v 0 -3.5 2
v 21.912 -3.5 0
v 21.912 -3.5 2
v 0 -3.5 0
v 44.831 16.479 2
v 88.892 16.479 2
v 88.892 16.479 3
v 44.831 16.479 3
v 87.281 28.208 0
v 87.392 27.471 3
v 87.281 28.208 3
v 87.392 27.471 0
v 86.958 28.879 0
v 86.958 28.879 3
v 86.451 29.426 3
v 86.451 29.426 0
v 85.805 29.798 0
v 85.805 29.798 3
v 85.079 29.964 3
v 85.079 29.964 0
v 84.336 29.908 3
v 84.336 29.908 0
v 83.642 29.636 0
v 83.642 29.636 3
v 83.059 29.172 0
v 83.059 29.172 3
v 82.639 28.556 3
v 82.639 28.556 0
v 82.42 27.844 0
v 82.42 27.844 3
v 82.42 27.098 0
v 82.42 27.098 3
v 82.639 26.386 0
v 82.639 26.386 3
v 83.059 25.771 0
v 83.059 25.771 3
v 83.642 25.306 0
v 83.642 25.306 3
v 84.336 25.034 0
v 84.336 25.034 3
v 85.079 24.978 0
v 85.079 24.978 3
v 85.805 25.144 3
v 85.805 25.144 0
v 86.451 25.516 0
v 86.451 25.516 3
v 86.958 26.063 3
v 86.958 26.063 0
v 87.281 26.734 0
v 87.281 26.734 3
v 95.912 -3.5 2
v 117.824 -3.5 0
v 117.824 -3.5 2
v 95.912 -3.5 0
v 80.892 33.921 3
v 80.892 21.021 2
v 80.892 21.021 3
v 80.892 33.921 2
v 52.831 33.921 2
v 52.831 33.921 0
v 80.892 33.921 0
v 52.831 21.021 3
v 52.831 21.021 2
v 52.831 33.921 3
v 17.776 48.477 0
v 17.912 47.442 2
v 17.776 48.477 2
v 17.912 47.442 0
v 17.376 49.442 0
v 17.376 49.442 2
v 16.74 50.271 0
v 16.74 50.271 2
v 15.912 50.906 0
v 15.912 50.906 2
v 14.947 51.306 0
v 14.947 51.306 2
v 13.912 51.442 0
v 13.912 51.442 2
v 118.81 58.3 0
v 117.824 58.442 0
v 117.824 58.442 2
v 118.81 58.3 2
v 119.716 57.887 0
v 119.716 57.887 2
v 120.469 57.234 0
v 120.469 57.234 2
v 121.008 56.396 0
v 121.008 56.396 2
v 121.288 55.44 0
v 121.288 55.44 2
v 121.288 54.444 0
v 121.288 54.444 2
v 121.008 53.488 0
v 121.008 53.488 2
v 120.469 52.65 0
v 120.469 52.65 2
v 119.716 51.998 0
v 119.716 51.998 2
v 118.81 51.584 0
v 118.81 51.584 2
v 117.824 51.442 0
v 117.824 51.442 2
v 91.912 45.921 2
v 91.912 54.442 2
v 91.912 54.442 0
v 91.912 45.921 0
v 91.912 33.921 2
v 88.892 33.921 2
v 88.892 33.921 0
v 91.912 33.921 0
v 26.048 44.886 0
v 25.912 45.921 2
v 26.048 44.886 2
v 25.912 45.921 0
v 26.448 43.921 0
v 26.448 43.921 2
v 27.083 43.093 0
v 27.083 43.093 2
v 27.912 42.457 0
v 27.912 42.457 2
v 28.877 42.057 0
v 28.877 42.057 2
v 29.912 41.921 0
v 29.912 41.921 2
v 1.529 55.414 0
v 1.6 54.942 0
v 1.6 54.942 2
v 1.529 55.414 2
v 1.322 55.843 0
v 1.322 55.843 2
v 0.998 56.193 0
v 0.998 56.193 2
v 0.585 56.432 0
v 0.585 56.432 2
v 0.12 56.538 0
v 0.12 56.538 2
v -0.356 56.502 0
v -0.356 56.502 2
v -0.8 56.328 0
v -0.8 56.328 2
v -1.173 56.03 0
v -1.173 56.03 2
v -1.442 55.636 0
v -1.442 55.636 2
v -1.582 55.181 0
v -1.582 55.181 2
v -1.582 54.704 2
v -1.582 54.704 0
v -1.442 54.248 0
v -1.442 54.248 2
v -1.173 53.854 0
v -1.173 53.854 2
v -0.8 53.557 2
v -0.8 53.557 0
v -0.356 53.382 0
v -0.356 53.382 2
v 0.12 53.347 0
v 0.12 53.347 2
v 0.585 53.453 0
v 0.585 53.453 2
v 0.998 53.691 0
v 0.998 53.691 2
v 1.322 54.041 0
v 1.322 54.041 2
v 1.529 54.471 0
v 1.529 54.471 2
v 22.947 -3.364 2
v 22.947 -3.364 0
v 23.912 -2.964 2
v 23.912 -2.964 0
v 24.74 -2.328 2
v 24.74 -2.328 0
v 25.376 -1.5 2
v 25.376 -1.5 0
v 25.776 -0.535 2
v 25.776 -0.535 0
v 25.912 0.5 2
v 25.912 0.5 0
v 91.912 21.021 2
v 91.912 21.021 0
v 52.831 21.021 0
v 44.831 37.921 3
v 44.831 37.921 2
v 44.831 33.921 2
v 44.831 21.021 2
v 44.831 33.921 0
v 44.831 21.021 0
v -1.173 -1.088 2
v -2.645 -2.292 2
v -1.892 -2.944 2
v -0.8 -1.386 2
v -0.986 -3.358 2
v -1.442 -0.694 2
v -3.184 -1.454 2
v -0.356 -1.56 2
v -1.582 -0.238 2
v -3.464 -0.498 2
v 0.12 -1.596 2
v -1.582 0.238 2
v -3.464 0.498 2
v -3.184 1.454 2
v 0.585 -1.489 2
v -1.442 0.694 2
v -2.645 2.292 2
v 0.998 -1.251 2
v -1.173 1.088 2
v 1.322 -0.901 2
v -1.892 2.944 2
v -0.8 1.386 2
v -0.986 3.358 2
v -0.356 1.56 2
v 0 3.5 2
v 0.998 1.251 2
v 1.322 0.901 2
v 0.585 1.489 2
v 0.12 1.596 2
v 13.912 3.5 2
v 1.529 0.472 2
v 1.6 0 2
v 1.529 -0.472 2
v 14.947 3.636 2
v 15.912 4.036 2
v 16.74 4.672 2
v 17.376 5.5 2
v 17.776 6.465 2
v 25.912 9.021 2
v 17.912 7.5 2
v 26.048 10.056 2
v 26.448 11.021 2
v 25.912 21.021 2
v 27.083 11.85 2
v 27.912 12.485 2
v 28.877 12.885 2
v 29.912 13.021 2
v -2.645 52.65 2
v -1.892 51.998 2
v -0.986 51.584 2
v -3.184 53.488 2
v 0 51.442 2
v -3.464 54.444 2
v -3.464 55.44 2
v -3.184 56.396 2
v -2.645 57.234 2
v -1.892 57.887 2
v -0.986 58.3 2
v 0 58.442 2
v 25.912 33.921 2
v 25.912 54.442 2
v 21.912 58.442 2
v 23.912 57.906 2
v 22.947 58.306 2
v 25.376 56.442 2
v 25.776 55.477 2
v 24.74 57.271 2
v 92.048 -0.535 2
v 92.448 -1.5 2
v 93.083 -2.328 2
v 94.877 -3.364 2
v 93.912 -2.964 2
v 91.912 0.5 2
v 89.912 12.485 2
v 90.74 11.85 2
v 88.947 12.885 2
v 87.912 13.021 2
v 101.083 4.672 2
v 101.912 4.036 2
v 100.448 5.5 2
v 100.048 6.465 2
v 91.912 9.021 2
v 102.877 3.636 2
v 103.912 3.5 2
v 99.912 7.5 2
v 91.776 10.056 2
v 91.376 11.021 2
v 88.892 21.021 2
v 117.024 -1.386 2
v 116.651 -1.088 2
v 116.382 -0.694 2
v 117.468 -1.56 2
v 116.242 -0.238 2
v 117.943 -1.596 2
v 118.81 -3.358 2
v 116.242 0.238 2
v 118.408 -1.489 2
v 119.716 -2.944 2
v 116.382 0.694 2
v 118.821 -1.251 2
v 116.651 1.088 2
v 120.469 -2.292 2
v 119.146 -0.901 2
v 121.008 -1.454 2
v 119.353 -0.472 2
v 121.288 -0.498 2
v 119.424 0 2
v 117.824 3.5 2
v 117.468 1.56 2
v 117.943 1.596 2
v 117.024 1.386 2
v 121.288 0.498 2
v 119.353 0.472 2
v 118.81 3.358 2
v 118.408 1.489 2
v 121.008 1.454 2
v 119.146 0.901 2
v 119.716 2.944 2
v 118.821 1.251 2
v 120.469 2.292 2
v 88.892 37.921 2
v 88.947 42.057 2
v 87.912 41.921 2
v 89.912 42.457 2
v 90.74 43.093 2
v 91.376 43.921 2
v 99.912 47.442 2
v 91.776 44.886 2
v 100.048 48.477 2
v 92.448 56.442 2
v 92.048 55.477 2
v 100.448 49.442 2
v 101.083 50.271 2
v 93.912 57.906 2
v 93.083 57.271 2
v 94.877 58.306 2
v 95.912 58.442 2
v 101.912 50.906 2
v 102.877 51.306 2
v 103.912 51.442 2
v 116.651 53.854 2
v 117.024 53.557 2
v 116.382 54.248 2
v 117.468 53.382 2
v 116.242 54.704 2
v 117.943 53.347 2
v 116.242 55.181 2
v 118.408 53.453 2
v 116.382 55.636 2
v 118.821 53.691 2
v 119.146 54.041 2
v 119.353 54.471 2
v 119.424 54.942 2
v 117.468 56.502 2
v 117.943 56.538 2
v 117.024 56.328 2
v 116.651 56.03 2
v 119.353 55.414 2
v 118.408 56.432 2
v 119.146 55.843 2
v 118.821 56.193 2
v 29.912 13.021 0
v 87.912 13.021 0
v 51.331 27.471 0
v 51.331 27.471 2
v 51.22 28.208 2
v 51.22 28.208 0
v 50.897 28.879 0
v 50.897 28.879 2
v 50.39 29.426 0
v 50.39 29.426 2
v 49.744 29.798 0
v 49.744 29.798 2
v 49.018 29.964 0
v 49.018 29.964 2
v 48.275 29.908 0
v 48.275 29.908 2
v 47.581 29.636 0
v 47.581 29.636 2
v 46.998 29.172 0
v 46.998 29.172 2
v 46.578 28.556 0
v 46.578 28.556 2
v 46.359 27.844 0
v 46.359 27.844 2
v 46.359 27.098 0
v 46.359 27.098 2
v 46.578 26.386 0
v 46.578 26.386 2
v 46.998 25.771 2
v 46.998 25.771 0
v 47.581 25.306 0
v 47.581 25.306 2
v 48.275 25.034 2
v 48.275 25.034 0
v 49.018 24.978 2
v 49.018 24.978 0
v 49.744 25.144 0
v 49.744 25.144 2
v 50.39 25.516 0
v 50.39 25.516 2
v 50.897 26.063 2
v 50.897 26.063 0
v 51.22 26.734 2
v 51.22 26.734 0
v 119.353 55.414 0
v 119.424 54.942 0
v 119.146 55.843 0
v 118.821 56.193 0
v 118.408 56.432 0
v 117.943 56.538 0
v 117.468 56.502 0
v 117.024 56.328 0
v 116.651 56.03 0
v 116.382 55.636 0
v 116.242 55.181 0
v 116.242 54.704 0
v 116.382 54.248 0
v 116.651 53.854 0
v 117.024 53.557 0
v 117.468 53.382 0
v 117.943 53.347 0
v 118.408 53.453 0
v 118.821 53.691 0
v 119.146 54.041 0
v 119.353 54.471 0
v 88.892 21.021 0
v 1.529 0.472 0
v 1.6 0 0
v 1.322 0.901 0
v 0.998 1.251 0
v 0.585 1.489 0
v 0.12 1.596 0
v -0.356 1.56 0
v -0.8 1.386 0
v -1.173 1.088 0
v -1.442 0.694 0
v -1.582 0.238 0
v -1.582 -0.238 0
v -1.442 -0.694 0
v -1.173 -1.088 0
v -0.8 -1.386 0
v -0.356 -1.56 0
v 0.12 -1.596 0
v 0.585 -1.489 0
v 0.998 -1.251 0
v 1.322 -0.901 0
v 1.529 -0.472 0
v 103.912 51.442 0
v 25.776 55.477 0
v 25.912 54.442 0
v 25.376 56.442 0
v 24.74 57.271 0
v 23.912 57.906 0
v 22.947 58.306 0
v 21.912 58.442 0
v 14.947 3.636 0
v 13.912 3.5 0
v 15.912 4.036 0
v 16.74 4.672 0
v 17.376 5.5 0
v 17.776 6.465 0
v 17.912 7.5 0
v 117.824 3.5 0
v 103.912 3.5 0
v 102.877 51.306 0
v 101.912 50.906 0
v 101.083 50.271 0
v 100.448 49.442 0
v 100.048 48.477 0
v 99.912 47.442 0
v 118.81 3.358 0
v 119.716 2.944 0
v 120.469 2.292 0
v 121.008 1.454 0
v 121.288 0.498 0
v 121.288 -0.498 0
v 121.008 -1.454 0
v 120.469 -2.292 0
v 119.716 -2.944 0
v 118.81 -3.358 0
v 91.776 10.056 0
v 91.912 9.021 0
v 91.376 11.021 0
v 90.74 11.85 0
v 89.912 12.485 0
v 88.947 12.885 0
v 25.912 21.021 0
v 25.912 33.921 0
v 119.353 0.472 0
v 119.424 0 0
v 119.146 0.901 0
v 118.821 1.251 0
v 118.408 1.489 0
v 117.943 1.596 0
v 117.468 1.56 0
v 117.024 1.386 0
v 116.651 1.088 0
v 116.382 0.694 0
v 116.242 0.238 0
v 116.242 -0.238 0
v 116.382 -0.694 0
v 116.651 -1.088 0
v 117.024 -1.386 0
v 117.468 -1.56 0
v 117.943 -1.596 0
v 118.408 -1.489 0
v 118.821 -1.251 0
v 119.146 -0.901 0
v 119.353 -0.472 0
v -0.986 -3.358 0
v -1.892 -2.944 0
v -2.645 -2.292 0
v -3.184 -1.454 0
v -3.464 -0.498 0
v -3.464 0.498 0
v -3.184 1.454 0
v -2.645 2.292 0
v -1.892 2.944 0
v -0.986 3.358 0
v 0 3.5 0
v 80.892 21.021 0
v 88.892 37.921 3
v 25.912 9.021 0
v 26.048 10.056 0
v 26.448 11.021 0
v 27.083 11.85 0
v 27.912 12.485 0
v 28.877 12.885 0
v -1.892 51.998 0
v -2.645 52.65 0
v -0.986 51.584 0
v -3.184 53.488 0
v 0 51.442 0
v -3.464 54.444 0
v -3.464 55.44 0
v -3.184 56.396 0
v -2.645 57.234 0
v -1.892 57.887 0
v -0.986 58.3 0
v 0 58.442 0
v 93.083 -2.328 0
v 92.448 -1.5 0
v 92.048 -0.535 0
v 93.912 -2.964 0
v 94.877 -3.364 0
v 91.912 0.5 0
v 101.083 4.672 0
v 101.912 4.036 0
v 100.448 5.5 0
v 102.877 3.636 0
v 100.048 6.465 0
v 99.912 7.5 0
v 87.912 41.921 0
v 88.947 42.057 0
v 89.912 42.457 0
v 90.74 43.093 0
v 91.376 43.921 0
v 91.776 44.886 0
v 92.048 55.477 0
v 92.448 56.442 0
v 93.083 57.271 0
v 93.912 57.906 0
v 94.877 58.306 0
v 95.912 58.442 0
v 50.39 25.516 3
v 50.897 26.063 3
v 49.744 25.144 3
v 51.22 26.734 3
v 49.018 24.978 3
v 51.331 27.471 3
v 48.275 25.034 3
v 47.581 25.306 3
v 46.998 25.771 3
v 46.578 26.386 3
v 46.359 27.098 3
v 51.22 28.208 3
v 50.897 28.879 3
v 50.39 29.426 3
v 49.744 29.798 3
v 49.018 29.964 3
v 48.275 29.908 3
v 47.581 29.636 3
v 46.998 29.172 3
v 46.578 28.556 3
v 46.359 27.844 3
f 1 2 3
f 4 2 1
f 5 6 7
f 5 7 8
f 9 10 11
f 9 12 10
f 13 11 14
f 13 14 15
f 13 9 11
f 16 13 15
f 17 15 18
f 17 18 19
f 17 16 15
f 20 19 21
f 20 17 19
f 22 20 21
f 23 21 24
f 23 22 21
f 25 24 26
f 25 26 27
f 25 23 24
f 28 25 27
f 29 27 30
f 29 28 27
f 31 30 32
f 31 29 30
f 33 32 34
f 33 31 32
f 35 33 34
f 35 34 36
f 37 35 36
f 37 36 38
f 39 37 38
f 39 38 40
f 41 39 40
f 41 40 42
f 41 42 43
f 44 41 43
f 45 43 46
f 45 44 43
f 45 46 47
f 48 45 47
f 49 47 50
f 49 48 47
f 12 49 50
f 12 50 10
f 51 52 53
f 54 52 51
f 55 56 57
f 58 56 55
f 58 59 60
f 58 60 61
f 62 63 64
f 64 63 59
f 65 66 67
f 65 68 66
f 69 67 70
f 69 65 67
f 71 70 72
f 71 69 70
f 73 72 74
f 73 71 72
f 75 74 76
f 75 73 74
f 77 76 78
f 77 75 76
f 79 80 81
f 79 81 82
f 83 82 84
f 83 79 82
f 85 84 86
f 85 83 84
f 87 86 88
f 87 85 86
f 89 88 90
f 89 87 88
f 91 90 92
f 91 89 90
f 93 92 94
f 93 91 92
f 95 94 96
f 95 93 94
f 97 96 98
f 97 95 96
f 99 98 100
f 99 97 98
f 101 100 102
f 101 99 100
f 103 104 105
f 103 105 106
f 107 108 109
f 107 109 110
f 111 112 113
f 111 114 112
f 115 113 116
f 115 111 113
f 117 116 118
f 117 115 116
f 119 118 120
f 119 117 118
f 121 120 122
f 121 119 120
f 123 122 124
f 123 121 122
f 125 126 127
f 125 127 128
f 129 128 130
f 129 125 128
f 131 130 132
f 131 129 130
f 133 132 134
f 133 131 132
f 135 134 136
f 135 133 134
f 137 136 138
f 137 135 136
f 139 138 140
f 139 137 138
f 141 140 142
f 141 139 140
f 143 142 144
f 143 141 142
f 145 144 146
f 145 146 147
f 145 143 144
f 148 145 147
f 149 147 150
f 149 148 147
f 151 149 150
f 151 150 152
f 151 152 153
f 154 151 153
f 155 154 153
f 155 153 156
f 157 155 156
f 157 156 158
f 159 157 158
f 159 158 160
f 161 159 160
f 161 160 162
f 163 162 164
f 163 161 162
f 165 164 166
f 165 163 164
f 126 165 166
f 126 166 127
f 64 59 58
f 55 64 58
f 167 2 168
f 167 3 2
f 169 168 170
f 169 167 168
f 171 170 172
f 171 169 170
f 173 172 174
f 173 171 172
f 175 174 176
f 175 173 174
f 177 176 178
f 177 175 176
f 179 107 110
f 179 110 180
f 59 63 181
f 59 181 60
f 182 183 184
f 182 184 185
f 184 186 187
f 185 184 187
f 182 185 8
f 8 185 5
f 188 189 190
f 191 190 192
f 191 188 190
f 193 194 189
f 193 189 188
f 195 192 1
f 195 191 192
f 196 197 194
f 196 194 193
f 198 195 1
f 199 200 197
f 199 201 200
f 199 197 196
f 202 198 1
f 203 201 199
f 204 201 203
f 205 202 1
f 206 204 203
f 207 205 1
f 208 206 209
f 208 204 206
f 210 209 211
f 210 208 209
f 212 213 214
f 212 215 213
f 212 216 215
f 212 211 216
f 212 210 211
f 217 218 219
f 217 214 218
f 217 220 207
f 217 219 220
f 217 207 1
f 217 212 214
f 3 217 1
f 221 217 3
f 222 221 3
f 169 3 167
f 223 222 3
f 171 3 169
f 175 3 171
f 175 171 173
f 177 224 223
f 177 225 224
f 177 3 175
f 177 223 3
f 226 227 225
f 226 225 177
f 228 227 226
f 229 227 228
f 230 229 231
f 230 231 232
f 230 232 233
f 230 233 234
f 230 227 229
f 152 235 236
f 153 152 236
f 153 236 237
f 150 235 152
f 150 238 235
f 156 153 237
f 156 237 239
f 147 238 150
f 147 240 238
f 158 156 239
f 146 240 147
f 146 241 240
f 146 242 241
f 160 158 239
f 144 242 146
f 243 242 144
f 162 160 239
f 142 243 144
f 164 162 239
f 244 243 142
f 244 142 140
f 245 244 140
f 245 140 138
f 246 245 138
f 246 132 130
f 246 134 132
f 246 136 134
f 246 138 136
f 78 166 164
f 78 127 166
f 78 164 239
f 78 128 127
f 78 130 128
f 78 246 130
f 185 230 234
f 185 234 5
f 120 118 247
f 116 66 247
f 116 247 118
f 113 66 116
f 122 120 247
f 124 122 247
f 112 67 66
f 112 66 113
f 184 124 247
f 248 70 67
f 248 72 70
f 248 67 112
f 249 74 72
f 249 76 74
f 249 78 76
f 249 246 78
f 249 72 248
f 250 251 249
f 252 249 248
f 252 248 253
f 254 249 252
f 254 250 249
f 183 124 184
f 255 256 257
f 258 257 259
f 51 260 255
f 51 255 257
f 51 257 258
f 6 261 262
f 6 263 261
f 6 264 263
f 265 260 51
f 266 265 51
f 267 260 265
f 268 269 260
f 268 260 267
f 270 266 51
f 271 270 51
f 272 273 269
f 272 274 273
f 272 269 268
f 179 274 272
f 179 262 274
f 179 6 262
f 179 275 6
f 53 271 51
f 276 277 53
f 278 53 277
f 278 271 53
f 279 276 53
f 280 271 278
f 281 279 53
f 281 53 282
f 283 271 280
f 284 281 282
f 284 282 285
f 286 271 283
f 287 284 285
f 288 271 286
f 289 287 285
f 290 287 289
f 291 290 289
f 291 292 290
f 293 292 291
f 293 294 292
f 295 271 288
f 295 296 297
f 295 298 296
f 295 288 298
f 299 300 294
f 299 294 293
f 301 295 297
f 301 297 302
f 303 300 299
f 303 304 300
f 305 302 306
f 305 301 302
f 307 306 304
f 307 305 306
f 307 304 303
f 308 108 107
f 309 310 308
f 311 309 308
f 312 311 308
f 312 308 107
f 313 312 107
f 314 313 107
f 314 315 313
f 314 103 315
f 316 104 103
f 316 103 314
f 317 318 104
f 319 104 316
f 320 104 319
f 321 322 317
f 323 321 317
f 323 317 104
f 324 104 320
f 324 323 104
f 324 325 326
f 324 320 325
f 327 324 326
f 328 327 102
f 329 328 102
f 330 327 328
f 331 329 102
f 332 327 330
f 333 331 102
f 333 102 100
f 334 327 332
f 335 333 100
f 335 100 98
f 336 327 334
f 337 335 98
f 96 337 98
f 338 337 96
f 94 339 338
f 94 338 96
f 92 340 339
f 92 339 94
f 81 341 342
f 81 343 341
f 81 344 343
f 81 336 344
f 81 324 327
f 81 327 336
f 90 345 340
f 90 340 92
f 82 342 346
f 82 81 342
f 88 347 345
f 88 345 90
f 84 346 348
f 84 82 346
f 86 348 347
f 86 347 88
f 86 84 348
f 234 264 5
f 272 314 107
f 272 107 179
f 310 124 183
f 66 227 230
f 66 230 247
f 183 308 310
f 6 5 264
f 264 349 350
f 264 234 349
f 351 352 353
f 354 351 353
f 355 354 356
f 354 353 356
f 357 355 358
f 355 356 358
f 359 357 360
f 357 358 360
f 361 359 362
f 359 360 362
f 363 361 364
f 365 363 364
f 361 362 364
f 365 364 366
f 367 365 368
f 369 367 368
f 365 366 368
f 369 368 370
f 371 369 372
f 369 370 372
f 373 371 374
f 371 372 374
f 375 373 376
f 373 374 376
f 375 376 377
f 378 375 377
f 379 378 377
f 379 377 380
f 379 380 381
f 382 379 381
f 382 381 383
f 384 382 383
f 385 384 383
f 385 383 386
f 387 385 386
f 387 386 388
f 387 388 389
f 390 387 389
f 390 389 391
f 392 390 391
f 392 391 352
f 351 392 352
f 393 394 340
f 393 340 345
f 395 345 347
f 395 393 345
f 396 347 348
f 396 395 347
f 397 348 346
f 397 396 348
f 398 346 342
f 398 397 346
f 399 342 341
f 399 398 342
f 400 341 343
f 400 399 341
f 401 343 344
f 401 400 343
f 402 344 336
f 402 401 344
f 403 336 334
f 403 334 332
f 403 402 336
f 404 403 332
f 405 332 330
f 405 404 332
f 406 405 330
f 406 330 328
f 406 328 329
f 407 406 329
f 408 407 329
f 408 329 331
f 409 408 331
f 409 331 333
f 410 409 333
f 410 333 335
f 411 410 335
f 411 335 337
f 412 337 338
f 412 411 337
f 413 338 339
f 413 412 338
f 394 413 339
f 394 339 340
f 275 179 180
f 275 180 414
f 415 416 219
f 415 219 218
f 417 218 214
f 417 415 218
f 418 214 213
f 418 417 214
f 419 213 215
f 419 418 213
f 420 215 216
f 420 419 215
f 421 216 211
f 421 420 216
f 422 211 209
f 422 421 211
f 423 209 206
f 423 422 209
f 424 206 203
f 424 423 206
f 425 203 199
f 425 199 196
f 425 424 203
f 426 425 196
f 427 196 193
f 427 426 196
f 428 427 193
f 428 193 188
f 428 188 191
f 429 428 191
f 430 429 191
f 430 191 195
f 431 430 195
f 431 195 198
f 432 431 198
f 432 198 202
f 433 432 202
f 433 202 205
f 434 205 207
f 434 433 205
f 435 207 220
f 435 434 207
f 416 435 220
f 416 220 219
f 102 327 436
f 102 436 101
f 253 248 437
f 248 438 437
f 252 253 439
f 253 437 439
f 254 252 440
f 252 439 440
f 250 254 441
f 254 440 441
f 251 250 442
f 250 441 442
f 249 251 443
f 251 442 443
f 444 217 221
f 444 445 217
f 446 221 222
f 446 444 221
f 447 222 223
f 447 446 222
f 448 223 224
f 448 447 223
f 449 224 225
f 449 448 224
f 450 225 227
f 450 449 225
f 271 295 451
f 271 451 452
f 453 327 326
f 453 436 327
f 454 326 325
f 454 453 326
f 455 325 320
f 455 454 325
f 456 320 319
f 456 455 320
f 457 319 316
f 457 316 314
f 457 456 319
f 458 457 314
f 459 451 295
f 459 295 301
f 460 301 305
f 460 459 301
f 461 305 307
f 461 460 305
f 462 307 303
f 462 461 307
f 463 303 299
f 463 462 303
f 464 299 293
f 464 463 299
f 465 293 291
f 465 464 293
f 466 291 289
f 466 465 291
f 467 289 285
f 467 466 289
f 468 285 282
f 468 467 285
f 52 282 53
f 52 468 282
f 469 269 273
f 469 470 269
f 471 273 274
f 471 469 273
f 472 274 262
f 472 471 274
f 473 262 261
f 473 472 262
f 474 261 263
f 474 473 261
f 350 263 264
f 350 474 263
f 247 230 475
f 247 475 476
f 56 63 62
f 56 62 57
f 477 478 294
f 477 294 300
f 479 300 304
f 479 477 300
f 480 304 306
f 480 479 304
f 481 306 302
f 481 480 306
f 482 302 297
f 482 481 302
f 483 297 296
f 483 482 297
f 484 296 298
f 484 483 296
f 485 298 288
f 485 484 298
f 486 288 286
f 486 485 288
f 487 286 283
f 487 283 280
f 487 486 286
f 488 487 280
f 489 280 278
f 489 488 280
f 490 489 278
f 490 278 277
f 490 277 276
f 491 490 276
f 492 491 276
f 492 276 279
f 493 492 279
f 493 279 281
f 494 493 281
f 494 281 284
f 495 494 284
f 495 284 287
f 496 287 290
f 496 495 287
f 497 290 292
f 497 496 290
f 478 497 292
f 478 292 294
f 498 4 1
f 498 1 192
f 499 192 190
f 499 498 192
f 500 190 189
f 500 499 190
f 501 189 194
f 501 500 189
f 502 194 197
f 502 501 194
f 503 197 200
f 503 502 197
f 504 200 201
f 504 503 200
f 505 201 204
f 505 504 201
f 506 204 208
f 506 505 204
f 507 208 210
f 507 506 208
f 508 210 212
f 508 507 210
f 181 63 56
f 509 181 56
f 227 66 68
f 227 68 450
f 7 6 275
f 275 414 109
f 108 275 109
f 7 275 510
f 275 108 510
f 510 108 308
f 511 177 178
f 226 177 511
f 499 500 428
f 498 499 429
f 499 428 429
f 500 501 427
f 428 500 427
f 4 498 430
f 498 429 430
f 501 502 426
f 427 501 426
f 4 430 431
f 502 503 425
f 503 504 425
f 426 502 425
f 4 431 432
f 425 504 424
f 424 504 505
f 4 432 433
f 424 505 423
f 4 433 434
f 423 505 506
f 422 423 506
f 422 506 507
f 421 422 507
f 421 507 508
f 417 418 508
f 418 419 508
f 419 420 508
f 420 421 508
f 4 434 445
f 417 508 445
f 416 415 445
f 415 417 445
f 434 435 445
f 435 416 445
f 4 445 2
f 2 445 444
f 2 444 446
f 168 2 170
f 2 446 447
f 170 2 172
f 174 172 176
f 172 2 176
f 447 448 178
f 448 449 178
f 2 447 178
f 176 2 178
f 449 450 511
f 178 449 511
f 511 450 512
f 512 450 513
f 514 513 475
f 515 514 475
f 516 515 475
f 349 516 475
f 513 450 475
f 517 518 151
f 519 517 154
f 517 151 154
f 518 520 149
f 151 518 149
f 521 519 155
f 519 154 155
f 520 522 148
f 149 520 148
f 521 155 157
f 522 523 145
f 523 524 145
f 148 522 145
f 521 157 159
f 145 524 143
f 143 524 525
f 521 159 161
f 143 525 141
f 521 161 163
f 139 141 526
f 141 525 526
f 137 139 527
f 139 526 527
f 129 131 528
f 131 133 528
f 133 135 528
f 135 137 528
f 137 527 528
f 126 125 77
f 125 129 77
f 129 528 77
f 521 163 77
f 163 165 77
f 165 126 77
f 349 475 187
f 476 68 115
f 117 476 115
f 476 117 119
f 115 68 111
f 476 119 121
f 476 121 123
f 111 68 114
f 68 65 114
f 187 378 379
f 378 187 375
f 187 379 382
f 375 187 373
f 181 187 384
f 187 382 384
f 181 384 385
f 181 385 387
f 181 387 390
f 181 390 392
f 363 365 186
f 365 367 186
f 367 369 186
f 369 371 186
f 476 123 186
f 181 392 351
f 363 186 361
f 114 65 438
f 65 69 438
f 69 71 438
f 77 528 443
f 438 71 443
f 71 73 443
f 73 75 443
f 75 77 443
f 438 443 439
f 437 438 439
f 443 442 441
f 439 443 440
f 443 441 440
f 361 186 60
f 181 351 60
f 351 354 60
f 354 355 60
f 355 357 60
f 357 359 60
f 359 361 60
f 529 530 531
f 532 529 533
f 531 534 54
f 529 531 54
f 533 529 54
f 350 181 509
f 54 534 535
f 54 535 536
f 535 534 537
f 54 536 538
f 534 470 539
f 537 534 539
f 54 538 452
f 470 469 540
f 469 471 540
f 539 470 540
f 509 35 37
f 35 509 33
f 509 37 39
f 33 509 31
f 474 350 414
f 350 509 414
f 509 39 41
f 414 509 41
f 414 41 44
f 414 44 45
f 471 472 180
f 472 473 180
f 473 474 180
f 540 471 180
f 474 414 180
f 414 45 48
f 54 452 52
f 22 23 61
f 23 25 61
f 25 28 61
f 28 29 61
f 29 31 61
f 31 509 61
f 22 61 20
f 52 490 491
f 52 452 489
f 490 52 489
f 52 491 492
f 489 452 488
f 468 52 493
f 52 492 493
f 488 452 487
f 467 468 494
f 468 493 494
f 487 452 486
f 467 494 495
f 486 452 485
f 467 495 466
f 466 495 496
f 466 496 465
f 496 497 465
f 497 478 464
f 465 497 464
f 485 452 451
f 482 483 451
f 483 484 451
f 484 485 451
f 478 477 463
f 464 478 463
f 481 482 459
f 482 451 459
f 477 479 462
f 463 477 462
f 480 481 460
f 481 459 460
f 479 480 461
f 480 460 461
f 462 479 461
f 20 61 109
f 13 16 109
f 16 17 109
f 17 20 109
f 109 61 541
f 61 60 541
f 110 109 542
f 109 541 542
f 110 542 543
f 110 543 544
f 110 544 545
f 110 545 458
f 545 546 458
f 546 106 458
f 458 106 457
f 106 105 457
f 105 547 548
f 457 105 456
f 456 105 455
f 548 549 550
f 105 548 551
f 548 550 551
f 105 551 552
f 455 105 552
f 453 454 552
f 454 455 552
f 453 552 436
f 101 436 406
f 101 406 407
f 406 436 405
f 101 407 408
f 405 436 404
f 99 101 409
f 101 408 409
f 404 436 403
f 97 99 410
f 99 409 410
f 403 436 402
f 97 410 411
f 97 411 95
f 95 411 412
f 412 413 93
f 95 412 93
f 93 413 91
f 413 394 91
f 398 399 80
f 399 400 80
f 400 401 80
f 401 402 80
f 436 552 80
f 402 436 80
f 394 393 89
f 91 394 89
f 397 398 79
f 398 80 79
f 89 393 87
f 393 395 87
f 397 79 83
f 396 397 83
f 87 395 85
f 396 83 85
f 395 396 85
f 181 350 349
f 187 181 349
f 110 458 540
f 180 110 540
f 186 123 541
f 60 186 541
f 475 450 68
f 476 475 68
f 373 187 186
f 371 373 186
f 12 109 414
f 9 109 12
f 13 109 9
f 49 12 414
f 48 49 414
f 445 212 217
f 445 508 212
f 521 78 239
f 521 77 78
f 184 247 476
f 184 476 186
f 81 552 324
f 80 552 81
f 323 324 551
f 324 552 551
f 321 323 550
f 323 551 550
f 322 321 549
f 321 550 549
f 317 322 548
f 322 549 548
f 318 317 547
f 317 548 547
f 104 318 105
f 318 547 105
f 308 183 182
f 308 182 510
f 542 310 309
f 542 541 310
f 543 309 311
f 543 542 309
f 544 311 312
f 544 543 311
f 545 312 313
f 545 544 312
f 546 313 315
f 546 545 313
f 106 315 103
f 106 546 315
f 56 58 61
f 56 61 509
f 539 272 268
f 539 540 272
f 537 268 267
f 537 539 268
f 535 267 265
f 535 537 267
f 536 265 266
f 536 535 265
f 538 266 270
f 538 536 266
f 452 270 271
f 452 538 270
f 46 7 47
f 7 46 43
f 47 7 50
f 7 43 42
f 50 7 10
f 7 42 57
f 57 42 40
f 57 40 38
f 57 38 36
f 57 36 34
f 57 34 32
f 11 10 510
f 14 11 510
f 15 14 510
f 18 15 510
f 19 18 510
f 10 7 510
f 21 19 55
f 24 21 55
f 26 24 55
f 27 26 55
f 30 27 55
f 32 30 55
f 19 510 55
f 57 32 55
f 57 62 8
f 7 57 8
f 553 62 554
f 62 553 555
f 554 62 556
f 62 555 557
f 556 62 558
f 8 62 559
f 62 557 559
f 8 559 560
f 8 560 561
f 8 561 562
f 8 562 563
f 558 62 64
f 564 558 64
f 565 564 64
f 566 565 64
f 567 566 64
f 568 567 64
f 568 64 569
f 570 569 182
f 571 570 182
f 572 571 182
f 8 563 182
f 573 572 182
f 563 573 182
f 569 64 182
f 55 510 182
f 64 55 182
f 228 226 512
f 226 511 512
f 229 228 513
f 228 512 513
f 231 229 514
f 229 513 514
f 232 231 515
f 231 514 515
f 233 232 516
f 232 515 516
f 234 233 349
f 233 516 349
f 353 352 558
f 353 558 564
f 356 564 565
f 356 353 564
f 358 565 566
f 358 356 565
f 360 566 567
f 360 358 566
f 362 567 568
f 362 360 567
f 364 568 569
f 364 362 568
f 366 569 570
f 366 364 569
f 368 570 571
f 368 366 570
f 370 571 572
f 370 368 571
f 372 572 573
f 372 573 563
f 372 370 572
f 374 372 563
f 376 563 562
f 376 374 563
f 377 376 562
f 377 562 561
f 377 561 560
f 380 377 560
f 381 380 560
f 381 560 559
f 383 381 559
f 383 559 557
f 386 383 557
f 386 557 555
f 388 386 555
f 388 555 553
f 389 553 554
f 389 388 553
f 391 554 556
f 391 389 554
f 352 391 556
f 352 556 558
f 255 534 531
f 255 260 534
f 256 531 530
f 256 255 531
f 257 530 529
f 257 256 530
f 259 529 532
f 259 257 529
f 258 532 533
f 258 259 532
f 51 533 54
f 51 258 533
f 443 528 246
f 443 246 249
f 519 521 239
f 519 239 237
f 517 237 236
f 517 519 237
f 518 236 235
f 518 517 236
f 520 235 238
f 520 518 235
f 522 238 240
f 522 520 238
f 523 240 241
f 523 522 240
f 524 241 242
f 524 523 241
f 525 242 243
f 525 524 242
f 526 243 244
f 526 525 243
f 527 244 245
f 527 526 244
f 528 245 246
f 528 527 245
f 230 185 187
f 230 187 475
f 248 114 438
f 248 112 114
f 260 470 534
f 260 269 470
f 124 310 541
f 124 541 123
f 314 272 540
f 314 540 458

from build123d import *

# Parameters (mm, degrees)
SKETCH1_R            = 1.6
SKETCH1_R_2          = 2.1
BOSS_EXTRUDE3_DEPTH  = 2
BOSS_EXTRUDE4_DEPTH  = 2
SKETCH4_W            = 66
SKETCH4_H            = 16.340111315
SKETCH4_H_2          = 24.741581589
CUT_EXTRUDE3_DEPTH   = 14.5
FILLET1_R            = 4
SKETCH5_W            = 26
SKETCH5_H            = 27
SKETCH5_R            = 6
BOSS_EXTRUDE5_DEPTH  = 2
SKETCH6_W            = 5
SKETCH6_H            = 27
CUT_EXTRUDE4_DEPTH   = 14.5
SKETCH7_R            = 2.5
BOSS_EXTRUDE6_DEPTH  = 2
SKETCH8_R            = 2.5
CUT_EXTRUDE5_DEPTH   = 10
SKETCH9_W            = 22.081
SKETCH9_H            = 27
CUT_EXTRUDE6_DEPTH   = 10
CUT_EXTRUDE7_DEPTH   = 10
SKETCH11_W           = 28.061
SKETCH11_H           = 7.05
BOSS_EXTRUDE7_DEPTH  = 2
SKETCH12_W           = 44.061
SKETCH12_H           = 28.9
CUT_EXTRUDE9_DEPTH   = 10
BOSS_EXTRUDE9_DEPTH  = 2
FILLET2_R            = 4
SKETCH14_R           = 2.5
SKETCH14_W           = 28.061
SKETCH14_H           = 12.9
BOSS_EXTRUDE10_DEPTH = 1


with BuildPart() as part:
    # Sketch1 → Boss-Extrude3 (new body)
    with BuildSketch(Plane.XY):
        with BuildLine():
            Line((0, 3.5), (37.911912125, 3.5))
            Line((37.911912125, 3.5), (37.911912125, 13.97107578))
            Line((37.911912125, 13.97107578), (37.911912125, 40.97107578))
            Line((37.911912125, 40.97107578), (37.911912125, 51.44215156))
            Line((37.911912125, 51.44215156), (0, 51.44215156))
            ThreePointArc((0, 51.44215156), (-3.5, 54.94215156), (0, 58.44215156))
            Line((0, 58.44215156), (45.911912125, 58.44215156))
            Line((45.911912125, 58.44215156), (45.911912125, 51.44215156))
            Line((45.911912125, 51.44215156), (45.911912125, 48.97107578))
            Line((45.911912125, 48.97107578), (50.911912125, 48.97107578))
            Line((50.911912125, 48.97107578), (66.911912125, 48.97107578))
            Line((66.911912125, 48.97107578), (71.911912125, 48.97107578))
            Line((71.911912125, 48.97107578), (71.911912125, 51.44215156))
            Line((71.911912125, 51.44215156), (71.911912125, 58.44215156))
            Line((71.911912125, 58.44215156), (117.82382425, 58.44215156))
            ThreePointArc((117.82382425, 58.44215156), (121.32382425, 54.94215156), (117.82382425, 51.44215156))
            Line((117.82382425, 51.44215156), (79.911912125, 51.44215156))
            Line((79.911912125, 51.44215156), (79.911912125, 40.97107578))
            Line((79.911912125, 40.97107578), (79.911912125, 13.97107578))
            Line((79.911912125, 13.97107578), (79.911912125, 3.5))
            Line((79.911912125, 3.5), (117.82382425, 3.5))
            ThreePointArc((117.82382425, 3.5), (121.32382425, 0), (117.82382425, -3.5))
            Line((117.82382425, -3.5), (71.911912125, -3.5))
            Line((71.911912125, -3.5), (71.911912125, 3.5))
            Line((71.911912125, 3.5), (71.911912125, 5.97107578))
            Line((71.911912125, 5.97107578), (66.911912125, 5.97107578))
            Line((66.911912125, 5.97107578), (50.911912125, 5.97107578))
            Line((50.911912125, 5.97107578), (45.911912125, 5.97107578))
            Line((45.911912125, 5.97107578), (45.911912125, 3.5))
            Line((45.911912125, 3.5), (45.911912125, -3.5))
            Line((45.911912125, -3.5), (0, -3.5))
            ThreePointArc((0, -3.5), (-3.5, 0), (0, 3.5))
        make_face()
        with Locations((0, 54.94215156)):
            Circle(SKETCH1_R, mode=Mode.SUBTRACT)
        with Locations((117.82382425, 54.94215156)):
            Circle(SKETCH1_R, mode=Mode.SUBTRACT)
        with Locations((117.82382425, 0)):
            Circle(SKETCH1_R, mode=Mode.SUBTRACT)
        Circle(SKETCH1_R, mode=Mode.SUBTRACT)
        with Locations((66.911912125, 44.97107578)):
            Circle(SKETCH1_R_2, mode=Mode.SUBTRACT)
        with Locations((66.911912125, 9.97107578)):
            Circle(SKETCH1_R_2, mode=Mode.SUBTRACT)
        with Locations((50.911912125, 9.97107578)):
            Circle(SKETCH1_R_2, mode=Mode.SUBTRACT)
        with Locations((50.911912125, 44.97107578)):
            Circle(SKETCH1_R_2, mode=Mode.SUBTRACT)
        Polygon((66.911912125, 40.97107578), (50.911912125, 40.97107578), (45.911912125, 40.97107578), (45.911912125, 27.47107578), (45.911912125, 13.97107578), (50.911912125, 13.97107578), (66.911912125, 13.97107578), (71.911912125, 13.97107578), (71.911912125, 27.47107578), (71.911912125, 40.97107578), align=None, mode=Mode.SUBTRACT)
    extrude(amount=BOSS_EXTRUDE3_DEPTH)

    # Sketch3 → Boss-Extrude4 (add)
    with BuildSketch(Plane.XY.offset(2)):
        Polygon((71.911912125, 13.97107578), (99.911912125, 13.97107578), (99.911912125, 3.5), (91.911912125, 3.5), (91.911912125, 5.97107578), (71.911912125, 5.97107578), align=None)
        Polygon((91.911912125, 51.44215156), (99.911912125, 51.44215156), (99.911912125, 40.97107578), (71.911912125, 40.97107578), (71.911912125, 48.97107578), (91.911912125, 48.97107578), align=None)
        Polygon((45.911912125, 40.97107578), (17.911912125, 40.97107578), (17.911912125, 51.44215156), (25.911912125, 51.44215156), (25.911912125, 48.97107578), (45.911912125, 48.97107578), align=None)
        Polygon((25.911912125, 3.5), (17.911912125, 3.5), (17.911912125, 13.97107578), (45.911912125, 13.97107578), (45.911912125, 5.97107578), (25.911912125, 5.97107578), align=None)
    extrude(amount=-BOSS_EXTRUDE4_DEPTH)

    # Sketch4 → Cut-Extrude3 (cut)
    with BuildSketch(Plane.XY.offset(2)):
        with Locations((58.911912125, 57.141131438)):
            Rectangle(SKETCH4_W, SKETCH4_H)
        with Locations((58.911912125, -6.399715014)):
            Rectangle(SKETCH4_W, SKETCH4_H_2)
    extrude(amount=-CUT_EXTRUDE3_DEPTH, mode=Mode.SUBTRACT)

    # Fillet1
    fillet1_edges = [part.edges().sort_by_distance(p)[0] for p in [
        (99.911912125, 13.97107578, 1),
        (99.911912125, 3.5, 1),
        (91.911912125, 5.97107578, 1),
        (91.911912125, 48.97107578, 1),
        (99.911912125, 51.44215156, 1),
        (99.911912125, 40.97107578, 1),
        (17.911912125, 40.97107578, 1),
        (17.911912125, 51.44215156, 1),
        (25.911912125, 48.97107578, 1),
        (25.911912125, 5.97107578, 1),
        (17.911912125, 3.5, 1),
        (17.911912125, 13.97107578, 1),
        (91.911912125, 58.44215156, 1),
        (25.911912125, 58.44215156, 1),
        (91.911912125, -3.5, 1),
        (25.911912125, -3.5, 1),
    ]]
    fillet(fillet1_edges, radius=FILLET1_R)

    # Sketch5 → Boss-Extrude5 (add)
    with BuildSketch(Plane.XY.offset(2)):
        with Locations((58.911912125, 27.47107578)):
            Rectangle(SKETCH5_W, SKETCH5_H)
        with Locations((58.911912125, 27.47107578)):
            Circle(SKETCH5_R, mode=Mode.SUBTRACT)
    extrude(amount=-BOSS_EXTRUDE5_DEPTH)

    # Sketch6 → Cut-Extrude4 (cut)
    with BuildSketch(Plane.XY.offset(2)):
        with Locations((40.411912125, 27.47107578)):
            Rectangle(SKETCH6_W, SKETCH6_H)
        with Locations((77.411912125, 27.47107578)):
            Rectangle(SKETCH6_W, SKETCH6_H)
    extrude(amount=-CUT_EXTRUDE4_DEPTH, mode=Mode.SUBTRACT)

    # Sketch7 → Boss-Extrude6 (add)
    with BuildSketch(Plane.XY.offset(2)):
        Polygon((80.891912125, 27.47107578), (80.891912125, 40.97107578), (88.891912125, 40.97107578), (88.891912125, 27.47107578), (88.891912125, 13.97107578), (80.891912125, 13.97107578), align=None)
        with Locations((84.891912125, 27.47107578)):
            Circle(SKETCH7_R, mode=Mode.SUBTRACT)
    extrude(amount=-BOSS_EXTRUDE6_DEPTH)

    # Sketch8 → Cut-Extrude5 (cut)
    with BuildSketch(Plane.XY.offset(2)):
        with Locations((48.830912125, 27.47107578)):
            Circle(SKETCH8_R)
    extrude(amount=-CUT_EXTRUDE5_DEPTH, mode=Mode.SUBTRACT)

    # Sketch9 → Cut-Extrude6 (cut)
    with BuildSketch(Plane.XY.offset(2)):
        Polygon((42.911912125, 40.97107578), (44.830912125, 40.97107578), (44.830912125, 27.47107578), (44.830912125, 13.97107578), (42.911912125, 13.97107578), align=None)
        with Locations((63.871412125, 27.47107578)):
            Rectangle(SKETCH9_W, SKETCH9_H)
    extrude(amount=-CUT_EXTRUDE6_DEPTH, mode=Mode.SUBTRACT)

    # Sketch10 → Cut-Extrude7 (cut)
    with BuildSketch(Plane.XY.offset(2)):
        Polygon((44.830912125, 13.97107578), (44.830912125, 13.02107578), (88.891912125, 13.02107578), (88.891912125, 13.97107578), (106.020559472, 13.97107578), (106.020559472, 3.5), (12.964535502, 3.5), (12.964535502, 13.97107578), align=None)
        Polygon((88.891912125, 40.97107578), (88.891912125, 41.92107578), (44.830912125, 41.92107578), (44.830912125, 40.97107578), (12.964535502, 40.97107578), (12.964535502, 51.44215156), (106.020559472, 51.44215156), (106.020559472, 40.97107578), align=None)
    extrude(amount=-CUT_EXTRUDE7_DEPTH, mode=Mode.SUBTRACT)

    # Sketch11 → Boss-Extrude7 (add)
    with BuildSketch(Plane.XY.offset(2)):
        with Locations((66.861412125, 37.44607578)):
            Rectangle(SKETCH11_W, SKETCH11_H)
        with Locations((66.861412125, 17.49607578)):
            Rectangle(SKETCH11_W, SKETCH11_H)
    extrude(amount=-BOSS_EXTRUDE7_DEPTH)

    # Sketch12 → Cut-Extrude9 (cut)
    with BuildSketch(Plane.XY.offset(2)):
        Polygon((25.911912125, 1.23553789), (25.911912125, 54.44215156), (91.911912125, 54.44215156), (91.911912125, 0.5), align=None)
        with Locations((66.861412125, 27.47107578)):
            Rectangle(SKETCH12_W, SKETCH12_H, mode=Mode.SUBTRACT)
    extrude(amount=-CUT_EXTRUDE9_DEPTH, mode=Mode.SUBTRACT)

    # Sketch13 → Boss-Extrude9 (add)
    with BuildSketch(Plane.XY.offset(2)):
        Polygon((17.911912125, 3.5), (25.911912125, 3.5), (25.911912125, 13.02107578), (44.830912125, 13.02107578), (44.830912125, 21.02107578), (25.911912125, 21.02107578), (25.911912125, 33.92107578), (44.830912125, 33.92107578), (44.830912125, 41.92107578), (25.911912125, 41.92107578), (25.911912125, 51.44215156), (17.911912125, 51.44215156), (17.911912125, 13.02107578), align=None)
        Polygon((99.911912125, 51.44215156), (91.911912125, 51.44215156), (91.911912125, 41.92107578), (88.891912125, 41.92107578), (88.891912125, 33.92107578), (91.911912125, 33.92107578), (91.911912125, 21.02107578), (88.891912125, 21.02107578), (88.891912125, 13.02107578), (91.911912125, 13.02107578), (91.911912125, 3.5), (99.911912125, 3.5), (99.911912125, 41.92107578), align=None)
    extrude(amount=-BOSS_EXTRUDE9_DEPTH)

    # Fillet2
    fillet2_edges = [part.edges().sort_by_distance(p)[0] for p in [
        (99.911912125, 51.44215156, 1),
        (99.911912125, 3.5, 1),
        (91.911912125, 13.02107578, 1),
        (91.911912125, 41.92107578, 1),
        (25.911912125, 13.02107578, 1),
        (17.911912125, 3.5, 1),
        (17.911912125, 51.44215156, 1),
        (25.911912125, 41.92107578, 1),
    ]]
    fillet(fillet2_edges, radius=FILLET2_R)

    # Sketch14 → Boss-Extrude10 (add)
    with BuildSketch(Plane.XY.offset(2)):
        Polygon((44.830912125, 33.92107578), (44.830912125, 37.92107578), (88.891912125, 37.92107578), (88.891912125, 33.92107578), (88.891912125, 21.02107578), (88.891912125, 16.479152283), (44.830912125, 16.479152283), (44.830912125, 21.02107578), align=None)
        with Locations((48.830912125, 27.47107578)):
            Circle(SKETCH14_R, mode=Mode.SUBTRACT)
        with Locations((84.891912125, 27.47107578)):
            Circle(SKETCH14_R, mode=Mode.SUBTRACT)
        with Locations((66.861412125, 27.47107578)):
            Rectangle(SKETCH14_W, SKETCH14_H, mode=Mode.SUBTRACT)
    extrude(amount=BOSS_EXTRUDE10_DEPTH)


solid = part.part
